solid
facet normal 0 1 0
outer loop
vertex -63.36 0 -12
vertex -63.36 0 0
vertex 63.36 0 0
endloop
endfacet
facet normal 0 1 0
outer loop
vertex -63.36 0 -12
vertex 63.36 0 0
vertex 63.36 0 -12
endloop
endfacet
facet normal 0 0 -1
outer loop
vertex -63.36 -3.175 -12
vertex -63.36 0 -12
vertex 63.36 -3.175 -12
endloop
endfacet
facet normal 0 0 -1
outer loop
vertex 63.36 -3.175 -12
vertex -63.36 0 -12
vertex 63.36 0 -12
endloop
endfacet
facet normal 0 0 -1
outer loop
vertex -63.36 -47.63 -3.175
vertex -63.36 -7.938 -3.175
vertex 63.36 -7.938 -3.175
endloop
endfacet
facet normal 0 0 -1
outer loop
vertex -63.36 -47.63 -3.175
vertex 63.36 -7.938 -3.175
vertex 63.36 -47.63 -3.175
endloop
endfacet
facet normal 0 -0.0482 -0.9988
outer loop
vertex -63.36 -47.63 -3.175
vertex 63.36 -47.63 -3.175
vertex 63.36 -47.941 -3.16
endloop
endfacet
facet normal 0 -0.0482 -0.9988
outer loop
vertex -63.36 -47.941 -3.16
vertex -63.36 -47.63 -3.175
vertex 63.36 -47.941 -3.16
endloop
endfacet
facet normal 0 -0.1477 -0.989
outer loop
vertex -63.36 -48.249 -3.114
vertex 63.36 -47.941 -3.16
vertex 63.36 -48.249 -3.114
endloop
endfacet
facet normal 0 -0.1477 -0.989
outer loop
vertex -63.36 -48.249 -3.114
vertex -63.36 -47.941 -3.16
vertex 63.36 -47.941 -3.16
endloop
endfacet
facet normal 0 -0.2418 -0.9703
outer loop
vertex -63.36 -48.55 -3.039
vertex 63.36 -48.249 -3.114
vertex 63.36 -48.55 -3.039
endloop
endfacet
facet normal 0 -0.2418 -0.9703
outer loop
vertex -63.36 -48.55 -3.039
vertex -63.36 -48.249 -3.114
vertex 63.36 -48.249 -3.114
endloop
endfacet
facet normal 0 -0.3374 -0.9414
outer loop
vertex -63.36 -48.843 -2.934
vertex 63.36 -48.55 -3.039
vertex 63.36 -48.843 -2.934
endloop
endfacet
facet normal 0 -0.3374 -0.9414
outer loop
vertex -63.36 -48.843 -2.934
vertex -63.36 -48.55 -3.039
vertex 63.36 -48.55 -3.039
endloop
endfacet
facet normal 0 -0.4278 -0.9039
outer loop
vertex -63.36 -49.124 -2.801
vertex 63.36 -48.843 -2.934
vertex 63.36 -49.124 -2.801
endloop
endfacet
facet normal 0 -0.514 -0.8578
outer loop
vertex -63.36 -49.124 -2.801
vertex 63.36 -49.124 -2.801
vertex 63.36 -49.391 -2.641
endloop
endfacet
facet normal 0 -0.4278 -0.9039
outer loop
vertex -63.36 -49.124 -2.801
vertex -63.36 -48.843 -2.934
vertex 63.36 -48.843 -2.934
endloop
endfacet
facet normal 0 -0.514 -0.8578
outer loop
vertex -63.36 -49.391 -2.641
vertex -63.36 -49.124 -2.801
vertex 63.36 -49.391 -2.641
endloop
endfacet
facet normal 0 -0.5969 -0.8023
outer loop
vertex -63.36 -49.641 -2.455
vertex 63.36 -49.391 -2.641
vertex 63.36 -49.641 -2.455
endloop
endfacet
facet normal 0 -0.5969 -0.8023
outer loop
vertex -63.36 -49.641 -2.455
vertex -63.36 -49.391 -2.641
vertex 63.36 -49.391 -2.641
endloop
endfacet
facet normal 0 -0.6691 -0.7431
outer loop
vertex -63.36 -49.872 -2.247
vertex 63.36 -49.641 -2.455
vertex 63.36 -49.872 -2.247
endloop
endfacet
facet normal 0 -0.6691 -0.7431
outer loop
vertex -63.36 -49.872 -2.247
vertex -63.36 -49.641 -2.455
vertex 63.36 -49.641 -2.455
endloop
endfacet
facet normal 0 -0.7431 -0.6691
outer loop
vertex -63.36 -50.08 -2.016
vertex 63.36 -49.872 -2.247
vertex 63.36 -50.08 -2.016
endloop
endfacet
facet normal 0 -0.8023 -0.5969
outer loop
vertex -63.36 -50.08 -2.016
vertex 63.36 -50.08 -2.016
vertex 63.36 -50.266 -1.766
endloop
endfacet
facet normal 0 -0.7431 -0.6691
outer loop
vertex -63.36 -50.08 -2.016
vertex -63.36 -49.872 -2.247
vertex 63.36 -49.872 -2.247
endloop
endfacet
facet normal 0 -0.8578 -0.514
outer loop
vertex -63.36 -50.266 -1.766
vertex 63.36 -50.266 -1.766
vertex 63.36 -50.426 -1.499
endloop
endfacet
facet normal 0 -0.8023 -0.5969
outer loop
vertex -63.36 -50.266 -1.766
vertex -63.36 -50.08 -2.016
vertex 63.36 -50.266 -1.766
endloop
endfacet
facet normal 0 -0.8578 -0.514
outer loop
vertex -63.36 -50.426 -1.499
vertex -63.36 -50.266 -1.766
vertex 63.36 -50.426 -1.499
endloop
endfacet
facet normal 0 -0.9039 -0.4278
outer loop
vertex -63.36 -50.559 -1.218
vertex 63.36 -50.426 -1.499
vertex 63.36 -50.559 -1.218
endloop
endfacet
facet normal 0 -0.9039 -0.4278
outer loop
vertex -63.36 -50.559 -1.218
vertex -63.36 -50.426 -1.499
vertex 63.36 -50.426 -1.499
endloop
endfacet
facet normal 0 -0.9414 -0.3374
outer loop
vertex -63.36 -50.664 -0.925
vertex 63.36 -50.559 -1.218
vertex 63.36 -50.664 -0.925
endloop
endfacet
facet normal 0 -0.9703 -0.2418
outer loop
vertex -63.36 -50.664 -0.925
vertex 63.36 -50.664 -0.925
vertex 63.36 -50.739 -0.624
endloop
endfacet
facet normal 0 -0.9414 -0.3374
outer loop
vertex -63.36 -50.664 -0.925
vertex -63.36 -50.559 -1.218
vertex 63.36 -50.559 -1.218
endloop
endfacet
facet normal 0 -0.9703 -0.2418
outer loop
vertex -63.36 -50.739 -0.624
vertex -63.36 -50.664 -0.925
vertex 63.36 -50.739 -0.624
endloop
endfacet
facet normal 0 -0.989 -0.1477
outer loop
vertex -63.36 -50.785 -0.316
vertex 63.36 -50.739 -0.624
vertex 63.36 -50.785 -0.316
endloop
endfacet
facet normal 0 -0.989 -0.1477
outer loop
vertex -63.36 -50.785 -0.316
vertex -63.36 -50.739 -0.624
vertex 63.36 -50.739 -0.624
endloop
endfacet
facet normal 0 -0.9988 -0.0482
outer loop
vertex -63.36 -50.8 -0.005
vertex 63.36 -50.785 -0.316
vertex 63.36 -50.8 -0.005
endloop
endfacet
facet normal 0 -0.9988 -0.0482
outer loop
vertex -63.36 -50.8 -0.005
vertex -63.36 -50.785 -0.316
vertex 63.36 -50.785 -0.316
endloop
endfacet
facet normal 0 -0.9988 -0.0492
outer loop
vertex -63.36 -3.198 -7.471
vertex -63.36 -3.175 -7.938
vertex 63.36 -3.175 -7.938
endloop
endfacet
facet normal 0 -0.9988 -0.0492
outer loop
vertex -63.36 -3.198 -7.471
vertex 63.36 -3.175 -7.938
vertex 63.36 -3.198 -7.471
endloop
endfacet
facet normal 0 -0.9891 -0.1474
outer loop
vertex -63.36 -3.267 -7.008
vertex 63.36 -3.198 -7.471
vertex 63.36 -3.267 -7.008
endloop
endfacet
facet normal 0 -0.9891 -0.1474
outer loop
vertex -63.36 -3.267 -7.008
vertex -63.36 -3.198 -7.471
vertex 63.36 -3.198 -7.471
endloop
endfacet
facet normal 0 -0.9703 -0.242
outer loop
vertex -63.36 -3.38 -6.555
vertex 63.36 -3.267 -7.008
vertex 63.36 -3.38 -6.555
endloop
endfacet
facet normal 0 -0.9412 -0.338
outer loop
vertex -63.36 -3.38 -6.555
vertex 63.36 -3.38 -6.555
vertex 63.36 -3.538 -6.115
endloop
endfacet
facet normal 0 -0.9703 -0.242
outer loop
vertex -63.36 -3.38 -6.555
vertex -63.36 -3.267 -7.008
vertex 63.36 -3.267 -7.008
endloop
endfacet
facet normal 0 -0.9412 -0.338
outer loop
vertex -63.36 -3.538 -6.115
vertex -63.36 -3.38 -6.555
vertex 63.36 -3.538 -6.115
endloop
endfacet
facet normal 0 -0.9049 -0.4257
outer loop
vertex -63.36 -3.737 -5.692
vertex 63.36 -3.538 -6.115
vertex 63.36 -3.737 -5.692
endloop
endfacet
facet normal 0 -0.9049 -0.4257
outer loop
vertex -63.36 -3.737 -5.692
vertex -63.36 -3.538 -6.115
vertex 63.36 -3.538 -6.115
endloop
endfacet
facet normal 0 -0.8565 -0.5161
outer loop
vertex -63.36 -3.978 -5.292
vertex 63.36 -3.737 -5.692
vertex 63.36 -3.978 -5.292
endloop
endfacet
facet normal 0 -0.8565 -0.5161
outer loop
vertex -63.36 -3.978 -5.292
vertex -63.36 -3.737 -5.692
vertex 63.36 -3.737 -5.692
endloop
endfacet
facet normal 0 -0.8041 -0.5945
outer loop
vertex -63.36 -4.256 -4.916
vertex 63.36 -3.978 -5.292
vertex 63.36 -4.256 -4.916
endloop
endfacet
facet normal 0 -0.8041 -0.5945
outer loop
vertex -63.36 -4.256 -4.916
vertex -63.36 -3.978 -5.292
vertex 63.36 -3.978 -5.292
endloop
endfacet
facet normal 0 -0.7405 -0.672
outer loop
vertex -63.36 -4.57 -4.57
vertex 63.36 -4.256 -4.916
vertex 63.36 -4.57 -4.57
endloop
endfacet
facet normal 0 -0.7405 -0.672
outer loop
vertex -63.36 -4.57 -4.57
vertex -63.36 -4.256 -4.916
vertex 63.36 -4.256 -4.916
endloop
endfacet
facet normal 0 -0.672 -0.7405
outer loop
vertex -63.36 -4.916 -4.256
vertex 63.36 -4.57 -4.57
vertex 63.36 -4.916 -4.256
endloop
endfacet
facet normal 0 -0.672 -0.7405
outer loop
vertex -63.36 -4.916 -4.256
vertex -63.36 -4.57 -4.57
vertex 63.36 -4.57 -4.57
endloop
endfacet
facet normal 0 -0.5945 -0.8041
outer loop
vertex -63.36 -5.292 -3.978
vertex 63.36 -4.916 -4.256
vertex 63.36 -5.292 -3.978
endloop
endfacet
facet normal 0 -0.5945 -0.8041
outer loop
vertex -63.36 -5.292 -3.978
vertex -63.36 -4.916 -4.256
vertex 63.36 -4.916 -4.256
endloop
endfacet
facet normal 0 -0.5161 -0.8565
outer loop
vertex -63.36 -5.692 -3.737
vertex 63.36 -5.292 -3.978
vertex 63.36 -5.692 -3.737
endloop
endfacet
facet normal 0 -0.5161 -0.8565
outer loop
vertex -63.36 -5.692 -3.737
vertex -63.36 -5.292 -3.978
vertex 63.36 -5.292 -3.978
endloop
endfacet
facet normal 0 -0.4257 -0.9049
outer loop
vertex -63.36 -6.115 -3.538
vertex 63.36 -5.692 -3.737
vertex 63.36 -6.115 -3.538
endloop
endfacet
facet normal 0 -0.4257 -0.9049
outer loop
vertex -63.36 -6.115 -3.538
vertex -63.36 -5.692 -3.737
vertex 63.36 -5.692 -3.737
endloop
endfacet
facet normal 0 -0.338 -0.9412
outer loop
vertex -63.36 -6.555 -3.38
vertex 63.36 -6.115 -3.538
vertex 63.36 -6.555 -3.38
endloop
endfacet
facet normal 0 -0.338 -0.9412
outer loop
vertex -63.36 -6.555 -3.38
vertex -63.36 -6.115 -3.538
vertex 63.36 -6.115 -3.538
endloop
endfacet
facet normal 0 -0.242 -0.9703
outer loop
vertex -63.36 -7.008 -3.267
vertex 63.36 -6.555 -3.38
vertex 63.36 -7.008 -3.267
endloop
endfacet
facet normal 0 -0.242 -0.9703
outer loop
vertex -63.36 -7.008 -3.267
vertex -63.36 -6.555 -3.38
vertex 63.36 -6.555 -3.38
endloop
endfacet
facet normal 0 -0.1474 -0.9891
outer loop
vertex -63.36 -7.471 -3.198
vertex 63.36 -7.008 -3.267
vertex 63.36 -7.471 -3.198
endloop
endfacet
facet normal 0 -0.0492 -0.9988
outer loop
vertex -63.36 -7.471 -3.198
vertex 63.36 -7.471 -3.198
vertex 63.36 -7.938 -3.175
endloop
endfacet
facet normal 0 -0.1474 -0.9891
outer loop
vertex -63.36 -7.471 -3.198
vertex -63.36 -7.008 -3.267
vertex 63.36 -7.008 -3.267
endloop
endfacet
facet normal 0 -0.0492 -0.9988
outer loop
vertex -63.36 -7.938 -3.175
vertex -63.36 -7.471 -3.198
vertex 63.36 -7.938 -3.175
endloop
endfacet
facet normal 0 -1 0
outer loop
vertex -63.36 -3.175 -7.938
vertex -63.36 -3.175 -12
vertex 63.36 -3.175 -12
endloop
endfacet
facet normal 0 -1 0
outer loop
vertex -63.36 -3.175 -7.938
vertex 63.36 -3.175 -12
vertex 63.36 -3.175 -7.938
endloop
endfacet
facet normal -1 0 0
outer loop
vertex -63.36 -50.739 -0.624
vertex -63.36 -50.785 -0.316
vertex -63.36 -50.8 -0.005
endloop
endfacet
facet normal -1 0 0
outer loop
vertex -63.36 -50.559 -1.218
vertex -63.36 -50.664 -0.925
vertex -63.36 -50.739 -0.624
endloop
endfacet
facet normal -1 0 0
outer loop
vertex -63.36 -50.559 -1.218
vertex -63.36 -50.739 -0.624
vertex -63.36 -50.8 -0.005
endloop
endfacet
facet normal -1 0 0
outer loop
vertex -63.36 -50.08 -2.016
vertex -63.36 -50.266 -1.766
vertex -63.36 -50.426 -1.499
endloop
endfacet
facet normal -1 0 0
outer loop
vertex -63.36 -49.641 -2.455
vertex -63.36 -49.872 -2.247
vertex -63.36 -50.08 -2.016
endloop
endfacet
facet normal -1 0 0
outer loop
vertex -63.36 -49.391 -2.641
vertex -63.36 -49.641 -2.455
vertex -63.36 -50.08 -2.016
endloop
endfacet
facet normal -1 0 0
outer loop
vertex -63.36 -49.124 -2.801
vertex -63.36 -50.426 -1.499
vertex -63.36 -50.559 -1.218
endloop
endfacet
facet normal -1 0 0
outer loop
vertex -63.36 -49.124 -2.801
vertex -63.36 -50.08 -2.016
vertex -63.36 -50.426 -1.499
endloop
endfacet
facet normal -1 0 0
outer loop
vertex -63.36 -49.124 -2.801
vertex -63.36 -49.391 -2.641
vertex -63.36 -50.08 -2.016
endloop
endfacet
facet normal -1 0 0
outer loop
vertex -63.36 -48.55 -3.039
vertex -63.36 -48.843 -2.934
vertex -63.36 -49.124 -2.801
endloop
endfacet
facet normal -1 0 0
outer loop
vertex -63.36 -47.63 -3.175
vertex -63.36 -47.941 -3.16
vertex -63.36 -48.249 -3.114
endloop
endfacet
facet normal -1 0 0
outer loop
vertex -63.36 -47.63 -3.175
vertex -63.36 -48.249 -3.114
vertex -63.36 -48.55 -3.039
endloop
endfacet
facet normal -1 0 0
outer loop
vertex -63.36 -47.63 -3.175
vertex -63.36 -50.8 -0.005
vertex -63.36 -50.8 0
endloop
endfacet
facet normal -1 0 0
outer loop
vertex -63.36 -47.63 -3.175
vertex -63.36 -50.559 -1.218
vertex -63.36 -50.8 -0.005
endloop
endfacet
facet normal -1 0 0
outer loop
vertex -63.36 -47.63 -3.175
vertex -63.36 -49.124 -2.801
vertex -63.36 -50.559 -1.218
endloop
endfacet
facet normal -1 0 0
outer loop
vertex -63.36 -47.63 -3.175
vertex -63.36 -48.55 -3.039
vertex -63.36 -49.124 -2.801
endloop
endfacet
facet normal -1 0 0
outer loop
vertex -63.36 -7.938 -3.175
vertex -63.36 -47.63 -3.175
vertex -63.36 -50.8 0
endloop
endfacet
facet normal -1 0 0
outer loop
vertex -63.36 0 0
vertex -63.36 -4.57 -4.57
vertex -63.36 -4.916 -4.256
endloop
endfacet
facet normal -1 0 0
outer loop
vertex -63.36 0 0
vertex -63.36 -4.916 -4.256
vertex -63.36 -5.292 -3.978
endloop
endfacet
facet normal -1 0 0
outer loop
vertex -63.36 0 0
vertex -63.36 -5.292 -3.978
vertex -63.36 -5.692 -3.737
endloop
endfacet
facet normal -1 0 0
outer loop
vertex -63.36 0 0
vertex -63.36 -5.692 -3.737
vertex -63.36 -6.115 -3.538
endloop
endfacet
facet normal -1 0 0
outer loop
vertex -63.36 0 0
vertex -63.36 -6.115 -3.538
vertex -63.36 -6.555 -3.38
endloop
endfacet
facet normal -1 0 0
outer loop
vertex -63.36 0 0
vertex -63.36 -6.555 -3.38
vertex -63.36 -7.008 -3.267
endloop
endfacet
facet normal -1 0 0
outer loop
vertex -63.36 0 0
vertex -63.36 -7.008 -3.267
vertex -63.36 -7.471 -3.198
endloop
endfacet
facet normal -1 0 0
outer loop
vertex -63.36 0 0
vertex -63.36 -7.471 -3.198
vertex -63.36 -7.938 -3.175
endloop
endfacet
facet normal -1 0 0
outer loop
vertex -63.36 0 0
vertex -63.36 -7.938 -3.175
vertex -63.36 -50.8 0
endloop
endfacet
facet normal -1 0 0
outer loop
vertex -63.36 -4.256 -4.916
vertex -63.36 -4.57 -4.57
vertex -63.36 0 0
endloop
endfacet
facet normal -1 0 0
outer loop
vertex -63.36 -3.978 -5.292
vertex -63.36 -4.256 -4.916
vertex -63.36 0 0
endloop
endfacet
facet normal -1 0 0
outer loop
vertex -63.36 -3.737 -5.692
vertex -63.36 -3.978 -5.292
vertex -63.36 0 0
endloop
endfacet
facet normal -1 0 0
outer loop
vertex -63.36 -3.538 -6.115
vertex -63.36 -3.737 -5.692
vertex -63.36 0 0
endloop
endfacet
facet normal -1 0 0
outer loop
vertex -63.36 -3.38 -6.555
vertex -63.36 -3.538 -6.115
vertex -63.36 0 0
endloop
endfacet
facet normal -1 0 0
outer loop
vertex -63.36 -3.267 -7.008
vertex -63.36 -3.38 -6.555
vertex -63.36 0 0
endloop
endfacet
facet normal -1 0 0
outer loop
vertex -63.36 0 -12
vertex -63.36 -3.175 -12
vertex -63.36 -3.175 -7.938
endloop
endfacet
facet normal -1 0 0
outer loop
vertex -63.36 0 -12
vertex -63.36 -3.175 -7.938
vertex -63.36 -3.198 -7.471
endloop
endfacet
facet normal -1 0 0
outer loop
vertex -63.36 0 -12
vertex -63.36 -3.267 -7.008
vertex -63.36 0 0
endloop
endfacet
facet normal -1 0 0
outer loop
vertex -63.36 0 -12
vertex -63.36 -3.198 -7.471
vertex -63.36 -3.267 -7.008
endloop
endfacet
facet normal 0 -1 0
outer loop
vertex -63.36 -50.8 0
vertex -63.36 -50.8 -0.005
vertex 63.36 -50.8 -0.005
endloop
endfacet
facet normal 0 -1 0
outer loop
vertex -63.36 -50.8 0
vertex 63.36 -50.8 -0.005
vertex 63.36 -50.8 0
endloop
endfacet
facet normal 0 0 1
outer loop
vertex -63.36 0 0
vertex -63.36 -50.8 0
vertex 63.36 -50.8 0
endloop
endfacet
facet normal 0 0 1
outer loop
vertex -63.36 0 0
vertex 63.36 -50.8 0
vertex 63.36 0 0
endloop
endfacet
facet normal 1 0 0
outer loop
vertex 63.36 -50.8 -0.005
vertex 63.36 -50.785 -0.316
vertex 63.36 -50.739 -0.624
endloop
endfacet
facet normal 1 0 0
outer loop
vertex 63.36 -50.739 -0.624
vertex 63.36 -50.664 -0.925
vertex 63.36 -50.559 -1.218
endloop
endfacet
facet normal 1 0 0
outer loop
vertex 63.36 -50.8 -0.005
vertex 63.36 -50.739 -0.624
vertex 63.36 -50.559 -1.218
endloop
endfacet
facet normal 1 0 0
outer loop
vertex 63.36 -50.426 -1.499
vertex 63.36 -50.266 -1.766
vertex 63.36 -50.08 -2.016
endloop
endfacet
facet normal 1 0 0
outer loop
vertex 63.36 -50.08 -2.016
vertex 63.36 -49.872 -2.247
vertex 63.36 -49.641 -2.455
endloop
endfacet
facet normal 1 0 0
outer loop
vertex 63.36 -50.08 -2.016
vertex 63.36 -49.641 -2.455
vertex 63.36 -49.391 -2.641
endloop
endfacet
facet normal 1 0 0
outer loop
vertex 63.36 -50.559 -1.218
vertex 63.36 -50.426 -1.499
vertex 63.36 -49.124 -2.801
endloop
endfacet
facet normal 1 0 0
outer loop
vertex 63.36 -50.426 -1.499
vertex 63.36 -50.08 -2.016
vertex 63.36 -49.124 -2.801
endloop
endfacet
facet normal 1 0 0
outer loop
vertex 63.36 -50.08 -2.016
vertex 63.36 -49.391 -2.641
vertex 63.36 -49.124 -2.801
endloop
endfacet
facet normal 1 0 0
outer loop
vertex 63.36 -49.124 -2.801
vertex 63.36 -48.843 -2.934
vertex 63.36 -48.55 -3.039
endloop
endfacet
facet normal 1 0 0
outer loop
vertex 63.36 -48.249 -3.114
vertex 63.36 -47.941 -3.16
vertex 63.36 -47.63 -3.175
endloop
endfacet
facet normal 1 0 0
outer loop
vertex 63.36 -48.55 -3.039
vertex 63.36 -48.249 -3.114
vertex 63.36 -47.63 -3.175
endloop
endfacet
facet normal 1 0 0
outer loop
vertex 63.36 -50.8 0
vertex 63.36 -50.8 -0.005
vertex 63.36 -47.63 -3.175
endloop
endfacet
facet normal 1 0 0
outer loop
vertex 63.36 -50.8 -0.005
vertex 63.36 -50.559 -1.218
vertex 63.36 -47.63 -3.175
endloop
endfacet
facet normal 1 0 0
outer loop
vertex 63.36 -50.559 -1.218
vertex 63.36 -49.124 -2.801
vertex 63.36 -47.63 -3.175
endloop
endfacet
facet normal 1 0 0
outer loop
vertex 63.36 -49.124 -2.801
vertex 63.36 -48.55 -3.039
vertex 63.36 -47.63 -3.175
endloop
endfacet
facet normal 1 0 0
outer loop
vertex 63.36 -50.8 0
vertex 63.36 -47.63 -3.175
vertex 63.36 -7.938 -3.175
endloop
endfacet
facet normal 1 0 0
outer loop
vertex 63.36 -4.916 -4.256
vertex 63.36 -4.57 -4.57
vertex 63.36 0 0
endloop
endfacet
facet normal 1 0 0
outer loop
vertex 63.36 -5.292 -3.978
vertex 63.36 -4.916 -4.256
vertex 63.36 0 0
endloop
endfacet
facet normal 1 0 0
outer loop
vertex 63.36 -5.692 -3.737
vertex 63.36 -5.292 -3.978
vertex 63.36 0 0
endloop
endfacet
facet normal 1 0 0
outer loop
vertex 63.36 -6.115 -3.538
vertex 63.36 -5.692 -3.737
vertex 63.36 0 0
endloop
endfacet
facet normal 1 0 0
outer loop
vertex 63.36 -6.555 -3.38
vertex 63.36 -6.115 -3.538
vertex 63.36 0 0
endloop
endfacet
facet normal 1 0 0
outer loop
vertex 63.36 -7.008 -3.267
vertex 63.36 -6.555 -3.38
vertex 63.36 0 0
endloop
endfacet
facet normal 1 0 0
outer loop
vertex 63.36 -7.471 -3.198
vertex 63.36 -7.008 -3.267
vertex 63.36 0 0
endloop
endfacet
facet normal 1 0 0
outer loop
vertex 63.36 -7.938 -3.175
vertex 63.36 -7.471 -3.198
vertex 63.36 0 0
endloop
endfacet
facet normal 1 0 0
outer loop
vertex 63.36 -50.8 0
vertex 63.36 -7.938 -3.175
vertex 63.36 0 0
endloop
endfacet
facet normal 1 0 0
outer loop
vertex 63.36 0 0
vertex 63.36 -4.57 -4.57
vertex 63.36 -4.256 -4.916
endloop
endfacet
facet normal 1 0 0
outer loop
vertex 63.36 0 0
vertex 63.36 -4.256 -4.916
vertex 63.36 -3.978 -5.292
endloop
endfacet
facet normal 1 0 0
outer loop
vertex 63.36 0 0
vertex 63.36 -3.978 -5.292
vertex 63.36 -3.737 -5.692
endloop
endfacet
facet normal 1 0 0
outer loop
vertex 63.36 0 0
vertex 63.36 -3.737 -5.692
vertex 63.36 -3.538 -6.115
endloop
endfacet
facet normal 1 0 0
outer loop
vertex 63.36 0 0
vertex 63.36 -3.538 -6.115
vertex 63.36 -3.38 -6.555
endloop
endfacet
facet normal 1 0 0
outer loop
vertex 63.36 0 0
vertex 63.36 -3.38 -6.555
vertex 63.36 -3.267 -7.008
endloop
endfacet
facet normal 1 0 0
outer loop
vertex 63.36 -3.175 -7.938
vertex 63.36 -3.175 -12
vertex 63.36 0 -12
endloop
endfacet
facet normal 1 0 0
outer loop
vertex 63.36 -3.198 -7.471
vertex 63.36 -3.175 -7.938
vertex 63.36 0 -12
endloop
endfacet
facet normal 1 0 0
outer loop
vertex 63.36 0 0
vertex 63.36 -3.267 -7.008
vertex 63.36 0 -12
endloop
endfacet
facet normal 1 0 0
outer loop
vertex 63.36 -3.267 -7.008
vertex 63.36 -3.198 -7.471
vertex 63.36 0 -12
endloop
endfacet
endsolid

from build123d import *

# Parameters (mm, degrees)
HIERRO_ANGULAR_2_X_2_X_0_125_1_DEPTH = 126.72
CROQUIS3_W                           = 126.72
CROQUIS3_H                           = 38.8
CORTAR_EXTRUIR1_DEPTH                = 3.175


with BuildPart() as part:
    # Sketch1 → Hierro angular 2 X 2 X 0.125(1) (new body)
    with BuildSketch(Plane(origin=(-63.36, 0, 0), x_dir=(0, -1, 0), z_dir=(1, 0, 0))):
        with BuildLine():
            Line((0, 0), (0, 50.8))
            Line((0, 50.8), (0.00508, 50.8))
            ThreePointArc((0.00508, 50.8), (2.246551928, 49.871551928), (3.175, 47.63008))
            Line((3.175, 47.63008), (3.175, 7.9375))
            ThreePointArc((3.175, 7.9375), (4.569903955, 4.569903955), (7.9375, 3.175))
            Line((7.9375, 3.175), (47.63008, 3.175))
            ThreePointArc((47.63008, 3.175), (49.871551928, 2.246551928), (50.8, 0.00508))
            Line((50.8, 0.00508), (50.8, 0))
            Line((50.8, 0), (0, 0))
        make_face()
    extrude(amount=HIERRO_ANGULAR_2_X_2_X_0_125_1_DEPTH)

    # Croquis3 → Cortar-Extruir1 (cut)
    with BuildSketch(Plane(origin=(0, 0, 0), x_dir=(1, 0, 0), z_dir=(0, 1, 0))):
        with Locations((0, 31.4)):
            Rectangle(CROQUIS3_W, CROQUIS3_H)
    extrude(amount=-CORTAR_EXTRUIR1_DEPTH, mode=Mode.SUBTRACT)


solid = part.part
